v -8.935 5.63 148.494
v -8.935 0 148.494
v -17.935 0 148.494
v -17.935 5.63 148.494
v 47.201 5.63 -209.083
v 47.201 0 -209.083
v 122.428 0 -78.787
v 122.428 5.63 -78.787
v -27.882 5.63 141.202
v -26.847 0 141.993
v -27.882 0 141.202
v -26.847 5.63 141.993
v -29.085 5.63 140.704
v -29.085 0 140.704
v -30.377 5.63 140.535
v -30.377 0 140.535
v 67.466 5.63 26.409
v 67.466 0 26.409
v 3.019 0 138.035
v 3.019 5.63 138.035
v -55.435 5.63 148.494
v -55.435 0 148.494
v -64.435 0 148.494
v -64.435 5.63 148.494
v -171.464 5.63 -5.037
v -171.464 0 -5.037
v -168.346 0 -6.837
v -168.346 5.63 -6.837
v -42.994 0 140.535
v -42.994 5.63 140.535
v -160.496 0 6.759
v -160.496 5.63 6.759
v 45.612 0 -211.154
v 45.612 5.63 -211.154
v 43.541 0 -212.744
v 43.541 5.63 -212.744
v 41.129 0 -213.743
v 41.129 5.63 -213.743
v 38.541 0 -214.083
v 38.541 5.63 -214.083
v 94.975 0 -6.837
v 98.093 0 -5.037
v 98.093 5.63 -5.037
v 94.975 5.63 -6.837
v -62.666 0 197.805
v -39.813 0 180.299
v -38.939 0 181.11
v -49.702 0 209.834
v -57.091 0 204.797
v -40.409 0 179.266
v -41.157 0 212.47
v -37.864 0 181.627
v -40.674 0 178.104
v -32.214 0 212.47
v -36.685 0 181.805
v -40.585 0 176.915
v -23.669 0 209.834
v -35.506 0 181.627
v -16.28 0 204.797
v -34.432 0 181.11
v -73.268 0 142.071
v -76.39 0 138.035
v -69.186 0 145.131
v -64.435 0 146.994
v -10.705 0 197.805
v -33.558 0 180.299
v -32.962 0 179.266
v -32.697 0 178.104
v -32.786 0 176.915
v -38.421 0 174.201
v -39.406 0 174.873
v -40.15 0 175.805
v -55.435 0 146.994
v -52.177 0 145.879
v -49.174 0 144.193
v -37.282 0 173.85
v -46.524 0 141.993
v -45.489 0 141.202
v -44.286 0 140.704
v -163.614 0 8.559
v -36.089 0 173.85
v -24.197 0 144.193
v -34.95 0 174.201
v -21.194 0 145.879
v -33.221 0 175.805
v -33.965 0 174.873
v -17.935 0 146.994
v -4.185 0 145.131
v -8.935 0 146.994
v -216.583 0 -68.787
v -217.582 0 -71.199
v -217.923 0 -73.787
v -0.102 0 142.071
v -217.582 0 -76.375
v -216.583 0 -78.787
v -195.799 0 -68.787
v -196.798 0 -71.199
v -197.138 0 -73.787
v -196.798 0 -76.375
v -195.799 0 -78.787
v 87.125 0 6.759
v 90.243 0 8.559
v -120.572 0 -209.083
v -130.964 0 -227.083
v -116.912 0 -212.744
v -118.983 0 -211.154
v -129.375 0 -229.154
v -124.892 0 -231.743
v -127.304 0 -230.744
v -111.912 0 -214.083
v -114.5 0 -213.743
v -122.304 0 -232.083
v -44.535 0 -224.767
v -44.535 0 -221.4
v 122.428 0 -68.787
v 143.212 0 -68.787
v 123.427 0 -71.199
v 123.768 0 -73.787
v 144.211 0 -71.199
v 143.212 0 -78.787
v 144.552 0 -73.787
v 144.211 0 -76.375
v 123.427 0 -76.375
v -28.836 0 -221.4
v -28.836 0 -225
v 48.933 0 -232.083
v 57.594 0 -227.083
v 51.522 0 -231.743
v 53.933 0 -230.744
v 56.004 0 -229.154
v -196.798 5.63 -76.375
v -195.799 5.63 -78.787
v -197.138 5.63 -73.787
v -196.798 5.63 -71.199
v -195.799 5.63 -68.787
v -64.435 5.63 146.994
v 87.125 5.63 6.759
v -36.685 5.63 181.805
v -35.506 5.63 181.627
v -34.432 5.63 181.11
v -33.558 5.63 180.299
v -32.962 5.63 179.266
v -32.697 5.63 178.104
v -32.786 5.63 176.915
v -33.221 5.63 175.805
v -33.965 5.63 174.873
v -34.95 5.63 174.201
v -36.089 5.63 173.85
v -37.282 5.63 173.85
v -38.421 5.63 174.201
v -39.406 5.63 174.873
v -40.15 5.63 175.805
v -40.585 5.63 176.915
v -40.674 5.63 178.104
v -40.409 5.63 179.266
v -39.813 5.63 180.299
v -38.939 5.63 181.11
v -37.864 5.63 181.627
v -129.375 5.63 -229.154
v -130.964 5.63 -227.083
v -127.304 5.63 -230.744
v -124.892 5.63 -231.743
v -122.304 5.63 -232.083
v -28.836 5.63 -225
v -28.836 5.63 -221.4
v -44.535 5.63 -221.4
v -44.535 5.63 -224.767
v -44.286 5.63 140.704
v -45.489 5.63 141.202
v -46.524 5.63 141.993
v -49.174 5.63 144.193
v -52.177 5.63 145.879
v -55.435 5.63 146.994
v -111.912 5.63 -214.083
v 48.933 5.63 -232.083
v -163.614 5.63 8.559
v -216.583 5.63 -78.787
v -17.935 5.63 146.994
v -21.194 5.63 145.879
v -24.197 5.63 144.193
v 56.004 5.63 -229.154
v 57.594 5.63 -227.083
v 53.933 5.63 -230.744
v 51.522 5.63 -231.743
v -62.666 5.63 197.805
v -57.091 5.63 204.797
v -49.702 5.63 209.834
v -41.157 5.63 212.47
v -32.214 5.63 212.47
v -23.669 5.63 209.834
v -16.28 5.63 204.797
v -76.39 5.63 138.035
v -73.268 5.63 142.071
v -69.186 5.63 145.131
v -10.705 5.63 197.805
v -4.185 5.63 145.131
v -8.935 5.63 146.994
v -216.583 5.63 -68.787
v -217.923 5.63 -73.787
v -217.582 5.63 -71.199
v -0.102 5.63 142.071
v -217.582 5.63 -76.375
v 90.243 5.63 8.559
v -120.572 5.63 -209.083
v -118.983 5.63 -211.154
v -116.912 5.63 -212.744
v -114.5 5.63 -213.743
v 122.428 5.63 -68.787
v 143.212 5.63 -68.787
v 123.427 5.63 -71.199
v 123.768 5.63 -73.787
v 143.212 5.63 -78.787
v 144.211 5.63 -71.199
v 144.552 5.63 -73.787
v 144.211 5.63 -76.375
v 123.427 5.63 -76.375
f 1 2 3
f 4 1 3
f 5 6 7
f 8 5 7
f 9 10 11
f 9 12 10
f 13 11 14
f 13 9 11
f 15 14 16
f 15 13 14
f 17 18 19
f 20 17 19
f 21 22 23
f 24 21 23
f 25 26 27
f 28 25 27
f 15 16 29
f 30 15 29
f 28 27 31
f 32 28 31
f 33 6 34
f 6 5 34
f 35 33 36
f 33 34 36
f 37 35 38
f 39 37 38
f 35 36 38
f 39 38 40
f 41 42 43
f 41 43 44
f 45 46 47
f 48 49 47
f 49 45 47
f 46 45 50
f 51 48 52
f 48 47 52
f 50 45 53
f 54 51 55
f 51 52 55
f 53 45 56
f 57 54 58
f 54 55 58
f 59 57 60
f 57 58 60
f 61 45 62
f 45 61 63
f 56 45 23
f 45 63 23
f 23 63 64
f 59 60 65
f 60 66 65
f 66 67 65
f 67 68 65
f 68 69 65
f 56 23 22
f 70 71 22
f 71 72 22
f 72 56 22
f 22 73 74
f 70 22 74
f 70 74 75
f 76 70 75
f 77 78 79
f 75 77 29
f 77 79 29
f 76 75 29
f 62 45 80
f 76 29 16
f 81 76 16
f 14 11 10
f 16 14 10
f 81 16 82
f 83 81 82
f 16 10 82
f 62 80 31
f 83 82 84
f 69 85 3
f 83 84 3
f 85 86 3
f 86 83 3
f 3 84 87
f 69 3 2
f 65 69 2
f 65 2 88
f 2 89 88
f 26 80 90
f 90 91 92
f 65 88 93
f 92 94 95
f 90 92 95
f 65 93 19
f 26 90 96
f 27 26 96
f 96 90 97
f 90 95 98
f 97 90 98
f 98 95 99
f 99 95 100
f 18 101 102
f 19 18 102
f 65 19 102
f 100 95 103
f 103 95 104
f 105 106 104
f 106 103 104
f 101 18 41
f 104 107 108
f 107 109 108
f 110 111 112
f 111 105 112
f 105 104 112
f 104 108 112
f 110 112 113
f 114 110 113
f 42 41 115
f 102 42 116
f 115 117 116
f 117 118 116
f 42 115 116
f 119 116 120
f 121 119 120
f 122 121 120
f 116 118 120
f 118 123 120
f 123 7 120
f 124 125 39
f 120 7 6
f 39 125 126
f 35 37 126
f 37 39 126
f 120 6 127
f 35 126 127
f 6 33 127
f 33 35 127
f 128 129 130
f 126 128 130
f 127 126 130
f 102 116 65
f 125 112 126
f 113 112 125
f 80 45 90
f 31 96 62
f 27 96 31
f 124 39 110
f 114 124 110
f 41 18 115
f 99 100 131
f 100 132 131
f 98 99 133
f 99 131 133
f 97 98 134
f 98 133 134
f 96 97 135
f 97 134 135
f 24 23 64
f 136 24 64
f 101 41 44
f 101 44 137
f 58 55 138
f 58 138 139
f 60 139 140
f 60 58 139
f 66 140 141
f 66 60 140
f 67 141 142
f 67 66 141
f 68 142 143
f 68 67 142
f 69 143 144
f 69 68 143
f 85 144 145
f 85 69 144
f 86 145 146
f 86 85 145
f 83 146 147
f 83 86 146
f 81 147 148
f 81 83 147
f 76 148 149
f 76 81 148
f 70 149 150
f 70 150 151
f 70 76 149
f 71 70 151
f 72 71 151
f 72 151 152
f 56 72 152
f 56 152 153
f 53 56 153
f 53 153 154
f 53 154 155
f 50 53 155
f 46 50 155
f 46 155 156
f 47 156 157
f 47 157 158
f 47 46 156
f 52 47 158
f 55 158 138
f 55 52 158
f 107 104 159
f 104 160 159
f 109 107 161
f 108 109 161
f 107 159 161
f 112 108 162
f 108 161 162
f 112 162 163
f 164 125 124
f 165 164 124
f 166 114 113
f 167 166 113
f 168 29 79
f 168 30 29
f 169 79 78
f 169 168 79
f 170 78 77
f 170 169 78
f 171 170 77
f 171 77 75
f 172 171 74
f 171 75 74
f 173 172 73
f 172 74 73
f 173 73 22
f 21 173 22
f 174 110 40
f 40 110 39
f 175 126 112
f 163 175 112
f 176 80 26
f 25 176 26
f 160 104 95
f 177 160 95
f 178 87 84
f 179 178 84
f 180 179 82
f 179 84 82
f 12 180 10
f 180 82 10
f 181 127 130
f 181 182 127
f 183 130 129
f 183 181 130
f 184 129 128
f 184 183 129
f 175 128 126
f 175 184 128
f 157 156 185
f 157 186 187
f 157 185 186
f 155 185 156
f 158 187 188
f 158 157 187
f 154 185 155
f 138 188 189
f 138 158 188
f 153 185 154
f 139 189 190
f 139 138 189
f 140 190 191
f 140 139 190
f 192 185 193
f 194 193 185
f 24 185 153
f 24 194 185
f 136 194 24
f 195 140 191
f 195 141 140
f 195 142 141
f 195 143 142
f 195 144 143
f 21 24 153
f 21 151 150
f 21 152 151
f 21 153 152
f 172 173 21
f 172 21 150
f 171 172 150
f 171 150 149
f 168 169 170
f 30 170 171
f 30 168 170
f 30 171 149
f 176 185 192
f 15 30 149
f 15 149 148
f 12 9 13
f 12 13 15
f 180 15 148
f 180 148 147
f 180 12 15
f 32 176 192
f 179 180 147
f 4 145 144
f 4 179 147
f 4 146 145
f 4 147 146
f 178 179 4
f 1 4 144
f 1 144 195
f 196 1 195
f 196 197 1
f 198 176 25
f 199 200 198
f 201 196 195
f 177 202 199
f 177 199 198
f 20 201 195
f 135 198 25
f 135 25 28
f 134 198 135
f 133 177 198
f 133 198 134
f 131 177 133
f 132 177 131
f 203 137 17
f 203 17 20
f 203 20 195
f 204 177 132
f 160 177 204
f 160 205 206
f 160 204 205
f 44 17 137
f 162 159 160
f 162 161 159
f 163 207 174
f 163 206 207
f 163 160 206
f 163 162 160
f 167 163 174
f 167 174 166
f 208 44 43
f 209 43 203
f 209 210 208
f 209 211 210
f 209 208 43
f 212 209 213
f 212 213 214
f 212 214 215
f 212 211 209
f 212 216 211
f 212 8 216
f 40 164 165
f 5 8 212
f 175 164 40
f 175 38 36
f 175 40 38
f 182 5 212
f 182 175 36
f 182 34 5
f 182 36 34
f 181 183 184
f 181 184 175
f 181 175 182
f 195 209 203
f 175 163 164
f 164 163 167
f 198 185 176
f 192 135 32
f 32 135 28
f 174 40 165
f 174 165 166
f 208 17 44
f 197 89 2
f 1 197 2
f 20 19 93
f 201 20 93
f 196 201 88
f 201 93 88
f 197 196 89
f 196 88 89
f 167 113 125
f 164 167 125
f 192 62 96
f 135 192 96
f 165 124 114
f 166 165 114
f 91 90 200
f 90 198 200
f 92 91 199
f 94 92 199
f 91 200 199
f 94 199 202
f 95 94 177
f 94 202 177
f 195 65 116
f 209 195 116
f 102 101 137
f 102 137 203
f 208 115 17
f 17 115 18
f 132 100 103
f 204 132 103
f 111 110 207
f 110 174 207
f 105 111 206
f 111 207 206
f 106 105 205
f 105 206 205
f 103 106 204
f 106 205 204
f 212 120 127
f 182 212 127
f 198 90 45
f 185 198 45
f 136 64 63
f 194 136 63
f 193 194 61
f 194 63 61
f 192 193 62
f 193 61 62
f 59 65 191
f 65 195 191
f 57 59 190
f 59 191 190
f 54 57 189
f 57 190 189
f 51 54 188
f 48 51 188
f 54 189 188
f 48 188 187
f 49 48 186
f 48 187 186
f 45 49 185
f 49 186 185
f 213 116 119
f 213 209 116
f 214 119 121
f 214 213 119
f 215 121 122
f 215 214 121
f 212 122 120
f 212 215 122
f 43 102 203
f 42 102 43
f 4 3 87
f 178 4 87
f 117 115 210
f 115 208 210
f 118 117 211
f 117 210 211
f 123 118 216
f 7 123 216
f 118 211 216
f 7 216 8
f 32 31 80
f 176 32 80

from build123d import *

# Parameters (mm, degrees)
SKETCH1_R           = 4
BOSS_EXTRUDE1_DEPTH = 5.63
FILLET1_R           = 10
FILLET2_R           = 30
FILLET4_R           = 5


with BuildPart() as part:
    # Sketch1 → Boss-Extrude1 (new body)
    with BuildSketch(Plane(origin=(0, 0, 0), x_dir=(1, 0, 0), z_dir=(0, 1, 0))):
        Polygon((-36.68543943, -242.805029456), (146.099170261, 73.78720137), (54.706865415, 232.083316783), (-128.077744275, 232.083316783), (-219.470049121, 73.78720137), align=None)
        with Locations(Location((-36.68543943, -177.805029456, 0), (0, 0, 270))):
            Circle(SKETCH1_R, mode=Mode.SUBTRACT)
        with BuildLine():
            Line((67.466052068, -26.409354497), (3.019043242, -138.03484818))
            ThreePointArc((3.019043242, -138.03484818), (-2.040687786, -143.738783032), (-8.93543943, -146.994263122))
            Line((-8.93543943, -146.994263122), (-8.93543943, -148.494263122))
            Line((-8.93543943, -148.494263122), (-17.93543943, -148.494263122))
            Line((-17.93543943, -148.494263122), (-17.93543943, -146.994263122))
            ThreePointArc((-17.93543943, -146.994263122), (-23.578815596, -144.600710123), (-28.166359293, -140.53484818))
            Line((-28.166359293, -140.53484818), (-45.204519567, -140.53484818))
            ThreePointArc((-45.204519567, -140.53484818), (-49.792063264, -144.600710123), (-55.43543943, -146.994263122))
            Line((-55.43543943, -146.994263122), (-55.43543943, -148.494263122))
            Line((-55.43543943, -148.494263122), (-64.43543943, -148.494263122))
            Line((-64.43543943, -148.494263122), (-64.43543943, -146.994263122))
            ThreePointArc((-64.43543943, -146.994263122), (-71.330191074, -143.738783032), (-76.389922102, -138.03484818))
            Line((-76.389922102, -138.03484818), (-198.68543943, 73.78720137))
            Line((-198.68543943, 73.78720137), (-117.68543943, 214.083316783))
            Line((-117.68543943, 214.083316783), (44.31456057, 214.083316783))
            Line((44.31456057, 214.083316783), (125.31456057, 73.78720137))
            Line((125.31456057, 73.78720137), (67.466052068, -26.409354497))
        make_face(mode=Mode.SUBTRACT)
        Polygon((-44.534572815, 224.766675876), (-28.836306045, 224.99995769), (-28.836306045, 221.39995769), (-44.534572815, 221.39995769), align=None, mode=Mode.SUBTRACT)
        Polygon((-171.463513791, 5.037443083), (-168.345822337, 6.837443083), (-160.495822337, -6.759155756), (-163.613513791, -8.559155756), align=None, mode=Mode.SUBTRACT)
        Polygon((98.092634931, 5.037443083), (94.974943477, 6.837443083), (87.124943477, -6.759155756), (90.242634931, -8.559155756), align=None, mode=Mode.SUBTRACT)
    extrude(amount=BOSS_EXTRUDE1_DEPTH)

    # Fillet1
    fillet1_edges = [part.edges().sort_by_distance(p)[0] for p in [
        (125.31456057, 2.815, -73.78720137),
        (44.31456057, 2.815, -214.083316783),
        (-117.68543943, 2.815, -214.083316783),
        (-198.68543943, 2.815, -73.78720137),
        (146.099170261, 2.815, -73.78720137),
        (-219.470049121, 2.815, -73.78720137),
        (-128.077744275, 2.815, -232.083316783),
        (54.706865415, 2.815, -232.083316783),
    ]]
    fillet(fillet1_edges, radius=FILLET1_R)

    # Fillet2
    fillet2_edges = [part.edges().sort_by_distance(p)[0] for p in [
        (-36.68543943, 2.815, 242.805029456),
    ]]
    fillet(fillet2_edges, radius=FILLET2_R)

    # Fillet4
    fillet4_edges = [part.edges().sort_by_distance(p)[0] for p in [
        (-45.204519567, 2.815, 140.53484818),
        (-28.166359293, 2.815, 140.53484818),
    ]]
    fillet(fillet4_edges, radius=FILLET4_R)


solid = part.part
